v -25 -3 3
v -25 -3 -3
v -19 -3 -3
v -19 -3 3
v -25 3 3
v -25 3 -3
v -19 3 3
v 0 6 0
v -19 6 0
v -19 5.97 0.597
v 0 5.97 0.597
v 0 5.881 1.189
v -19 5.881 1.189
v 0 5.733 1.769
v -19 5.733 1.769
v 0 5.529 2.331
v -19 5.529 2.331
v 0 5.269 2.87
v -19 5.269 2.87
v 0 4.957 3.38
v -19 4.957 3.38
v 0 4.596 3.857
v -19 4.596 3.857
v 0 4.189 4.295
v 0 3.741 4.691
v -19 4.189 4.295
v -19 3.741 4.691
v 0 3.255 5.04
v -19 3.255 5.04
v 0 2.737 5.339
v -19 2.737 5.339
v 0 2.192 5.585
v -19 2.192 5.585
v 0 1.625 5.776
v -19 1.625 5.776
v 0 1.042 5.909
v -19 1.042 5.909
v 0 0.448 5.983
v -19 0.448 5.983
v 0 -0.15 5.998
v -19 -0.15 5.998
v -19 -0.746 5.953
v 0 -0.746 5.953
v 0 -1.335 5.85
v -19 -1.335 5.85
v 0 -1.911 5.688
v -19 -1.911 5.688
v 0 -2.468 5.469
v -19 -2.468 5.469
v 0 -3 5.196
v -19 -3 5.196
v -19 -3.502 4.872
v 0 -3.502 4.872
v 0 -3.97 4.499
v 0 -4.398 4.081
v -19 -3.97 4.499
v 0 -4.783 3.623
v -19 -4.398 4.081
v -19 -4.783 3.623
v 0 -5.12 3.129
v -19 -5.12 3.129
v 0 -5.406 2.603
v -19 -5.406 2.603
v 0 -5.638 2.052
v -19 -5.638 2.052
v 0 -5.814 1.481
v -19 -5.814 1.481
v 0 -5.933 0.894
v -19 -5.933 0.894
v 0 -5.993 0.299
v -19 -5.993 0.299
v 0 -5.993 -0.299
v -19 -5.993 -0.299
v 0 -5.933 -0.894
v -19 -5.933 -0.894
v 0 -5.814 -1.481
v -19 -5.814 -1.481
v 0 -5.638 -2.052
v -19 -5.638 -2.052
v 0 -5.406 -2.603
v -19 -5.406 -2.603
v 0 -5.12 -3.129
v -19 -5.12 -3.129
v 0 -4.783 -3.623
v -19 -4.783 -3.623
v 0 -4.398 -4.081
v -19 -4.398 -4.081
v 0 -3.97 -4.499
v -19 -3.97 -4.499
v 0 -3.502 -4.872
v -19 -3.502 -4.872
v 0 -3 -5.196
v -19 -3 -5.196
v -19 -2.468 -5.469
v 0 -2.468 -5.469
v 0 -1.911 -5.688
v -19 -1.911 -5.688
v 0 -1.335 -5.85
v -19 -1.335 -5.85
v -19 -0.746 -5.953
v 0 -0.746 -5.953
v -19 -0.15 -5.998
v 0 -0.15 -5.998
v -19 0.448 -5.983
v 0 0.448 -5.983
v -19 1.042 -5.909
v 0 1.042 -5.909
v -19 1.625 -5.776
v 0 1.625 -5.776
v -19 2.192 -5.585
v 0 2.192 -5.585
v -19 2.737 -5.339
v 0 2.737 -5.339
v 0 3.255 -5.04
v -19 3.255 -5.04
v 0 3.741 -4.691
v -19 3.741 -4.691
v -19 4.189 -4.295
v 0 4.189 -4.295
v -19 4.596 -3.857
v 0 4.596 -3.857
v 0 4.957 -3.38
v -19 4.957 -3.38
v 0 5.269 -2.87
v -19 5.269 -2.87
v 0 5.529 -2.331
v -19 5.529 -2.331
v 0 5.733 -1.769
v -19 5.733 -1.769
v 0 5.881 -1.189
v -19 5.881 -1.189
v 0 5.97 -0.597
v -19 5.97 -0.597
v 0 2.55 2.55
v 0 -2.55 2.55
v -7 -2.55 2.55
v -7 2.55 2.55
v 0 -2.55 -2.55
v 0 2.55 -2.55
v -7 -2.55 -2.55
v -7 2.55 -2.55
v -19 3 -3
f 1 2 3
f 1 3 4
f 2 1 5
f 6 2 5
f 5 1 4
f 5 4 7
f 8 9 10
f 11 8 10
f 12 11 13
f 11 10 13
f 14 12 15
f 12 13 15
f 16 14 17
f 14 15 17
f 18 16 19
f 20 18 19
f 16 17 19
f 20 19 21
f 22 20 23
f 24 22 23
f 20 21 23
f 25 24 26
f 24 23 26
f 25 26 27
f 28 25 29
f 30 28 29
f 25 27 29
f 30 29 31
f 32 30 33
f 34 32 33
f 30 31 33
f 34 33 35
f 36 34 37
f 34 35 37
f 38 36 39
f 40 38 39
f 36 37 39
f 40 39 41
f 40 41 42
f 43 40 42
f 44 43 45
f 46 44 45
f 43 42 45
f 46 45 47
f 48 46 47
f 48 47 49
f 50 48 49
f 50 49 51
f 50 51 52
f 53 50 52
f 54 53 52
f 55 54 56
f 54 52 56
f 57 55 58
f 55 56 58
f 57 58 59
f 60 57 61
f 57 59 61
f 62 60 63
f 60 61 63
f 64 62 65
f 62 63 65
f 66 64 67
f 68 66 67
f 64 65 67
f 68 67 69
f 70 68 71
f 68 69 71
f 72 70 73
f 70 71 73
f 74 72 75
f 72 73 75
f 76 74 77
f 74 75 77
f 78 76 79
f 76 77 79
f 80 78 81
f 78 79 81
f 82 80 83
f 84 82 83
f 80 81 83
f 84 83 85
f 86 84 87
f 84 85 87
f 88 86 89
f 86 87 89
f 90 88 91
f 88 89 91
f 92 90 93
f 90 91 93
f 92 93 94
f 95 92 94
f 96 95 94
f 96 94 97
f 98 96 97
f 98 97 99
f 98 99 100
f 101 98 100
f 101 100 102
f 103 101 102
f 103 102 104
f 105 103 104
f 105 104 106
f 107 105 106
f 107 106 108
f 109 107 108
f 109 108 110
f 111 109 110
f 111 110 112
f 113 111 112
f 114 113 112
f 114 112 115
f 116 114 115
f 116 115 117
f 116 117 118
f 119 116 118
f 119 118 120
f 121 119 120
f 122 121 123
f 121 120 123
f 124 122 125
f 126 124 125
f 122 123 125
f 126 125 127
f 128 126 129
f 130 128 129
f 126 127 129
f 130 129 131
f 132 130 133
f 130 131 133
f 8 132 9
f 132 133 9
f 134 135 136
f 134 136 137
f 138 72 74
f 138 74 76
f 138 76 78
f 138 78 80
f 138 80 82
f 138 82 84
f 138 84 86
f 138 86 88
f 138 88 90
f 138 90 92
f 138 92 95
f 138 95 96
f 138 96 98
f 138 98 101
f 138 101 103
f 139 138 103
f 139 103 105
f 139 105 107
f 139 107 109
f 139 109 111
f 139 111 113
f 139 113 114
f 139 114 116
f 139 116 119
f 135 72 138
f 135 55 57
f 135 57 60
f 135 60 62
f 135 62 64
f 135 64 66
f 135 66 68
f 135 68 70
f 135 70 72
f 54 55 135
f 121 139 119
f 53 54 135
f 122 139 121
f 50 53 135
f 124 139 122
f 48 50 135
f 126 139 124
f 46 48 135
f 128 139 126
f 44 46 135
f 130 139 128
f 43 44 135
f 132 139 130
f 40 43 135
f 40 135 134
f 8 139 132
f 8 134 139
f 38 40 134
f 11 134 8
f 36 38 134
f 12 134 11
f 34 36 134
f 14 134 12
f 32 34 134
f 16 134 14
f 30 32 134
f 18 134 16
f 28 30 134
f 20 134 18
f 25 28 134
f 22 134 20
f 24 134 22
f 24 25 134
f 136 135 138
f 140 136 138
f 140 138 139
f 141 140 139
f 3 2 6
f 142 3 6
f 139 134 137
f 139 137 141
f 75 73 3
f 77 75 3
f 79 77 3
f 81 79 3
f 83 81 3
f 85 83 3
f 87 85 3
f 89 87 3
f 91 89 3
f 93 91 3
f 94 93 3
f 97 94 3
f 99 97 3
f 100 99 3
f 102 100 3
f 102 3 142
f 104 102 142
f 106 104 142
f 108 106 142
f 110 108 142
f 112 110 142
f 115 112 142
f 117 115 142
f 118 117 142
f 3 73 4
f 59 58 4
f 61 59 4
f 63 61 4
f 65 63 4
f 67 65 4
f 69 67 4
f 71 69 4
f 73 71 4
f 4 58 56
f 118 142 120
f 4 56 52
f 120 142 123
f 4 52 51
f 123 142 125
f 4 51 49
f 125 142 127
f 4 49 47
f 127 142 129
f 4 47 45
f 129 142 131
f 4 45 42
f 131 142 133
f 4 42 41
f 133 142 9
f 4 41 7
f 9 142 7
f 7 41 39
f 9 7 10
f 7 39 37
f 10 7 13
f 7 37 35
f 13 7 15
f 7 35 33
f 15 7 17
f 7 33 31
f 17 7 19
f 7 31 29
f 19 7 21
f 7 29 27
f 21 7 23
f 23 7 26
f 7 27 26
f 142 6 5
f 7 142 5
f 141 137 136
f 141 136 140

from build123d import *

# Parameters (mm, degrees)
STOCK_STICK_1_START       = -19
STOCK_STICK_1_OUTLINE_R   = 6
STOCK_STICK_1_DEPTH       = 19
STOCK_STICK_1_START_2     = -25
STOCK_STICK_1_2_OUTLINE_W = 6
STOCK_STICK_1_2_OUTLINE_H = 6
STOCK_STICK_1_2_DEPTH     = 6
SKETCH1_W                 = 5.1
SKETCH1_H                 = 5.1
CUT_EXTRUDE1_DEPTH        = 7


# Read off the part's stored shape, not the designer's step: Stock-Stick-1
with BuildPart() as part:
    # Stock-Stick-1 outline → Stock-Stick-1 (new body)
    with BuildSketch(Plane.YZ.offset(STOCK_STICK_1_START)):
        Circle(STOCK_STICK_1_OUTLINE_R)
    extrude(amount=STOCK_STICK_1_DEPTH)

    # Stock-Stick-1 2 outline → Stock-Stick-1 2 (add)
    with BuildSketch(Plane.YZ.offset(STOCK_STICK_1_START_2)):
        Rectangle(STOCK_STICK_1_2_OUTLINE_W, STOCK_STICK_1_2_OUTLINE_H)
    extrude(amount=STOCK_STICK_1_2_DEPTH)

    # Sketch1 → Cut-Extrude1 (cut)
    with BuildSketch(Plane(origin=(0, 0, 0), x_dir=(0, 0, -1), z_dir=(1, 0, 0))):
        Rectangle(SKETCH1_W, SKETCH1_H)
    extrude(amount=-CUT_EXTRUDE1_DEPTH, mode=Mode.SUBTRACT)


solid = part.part
